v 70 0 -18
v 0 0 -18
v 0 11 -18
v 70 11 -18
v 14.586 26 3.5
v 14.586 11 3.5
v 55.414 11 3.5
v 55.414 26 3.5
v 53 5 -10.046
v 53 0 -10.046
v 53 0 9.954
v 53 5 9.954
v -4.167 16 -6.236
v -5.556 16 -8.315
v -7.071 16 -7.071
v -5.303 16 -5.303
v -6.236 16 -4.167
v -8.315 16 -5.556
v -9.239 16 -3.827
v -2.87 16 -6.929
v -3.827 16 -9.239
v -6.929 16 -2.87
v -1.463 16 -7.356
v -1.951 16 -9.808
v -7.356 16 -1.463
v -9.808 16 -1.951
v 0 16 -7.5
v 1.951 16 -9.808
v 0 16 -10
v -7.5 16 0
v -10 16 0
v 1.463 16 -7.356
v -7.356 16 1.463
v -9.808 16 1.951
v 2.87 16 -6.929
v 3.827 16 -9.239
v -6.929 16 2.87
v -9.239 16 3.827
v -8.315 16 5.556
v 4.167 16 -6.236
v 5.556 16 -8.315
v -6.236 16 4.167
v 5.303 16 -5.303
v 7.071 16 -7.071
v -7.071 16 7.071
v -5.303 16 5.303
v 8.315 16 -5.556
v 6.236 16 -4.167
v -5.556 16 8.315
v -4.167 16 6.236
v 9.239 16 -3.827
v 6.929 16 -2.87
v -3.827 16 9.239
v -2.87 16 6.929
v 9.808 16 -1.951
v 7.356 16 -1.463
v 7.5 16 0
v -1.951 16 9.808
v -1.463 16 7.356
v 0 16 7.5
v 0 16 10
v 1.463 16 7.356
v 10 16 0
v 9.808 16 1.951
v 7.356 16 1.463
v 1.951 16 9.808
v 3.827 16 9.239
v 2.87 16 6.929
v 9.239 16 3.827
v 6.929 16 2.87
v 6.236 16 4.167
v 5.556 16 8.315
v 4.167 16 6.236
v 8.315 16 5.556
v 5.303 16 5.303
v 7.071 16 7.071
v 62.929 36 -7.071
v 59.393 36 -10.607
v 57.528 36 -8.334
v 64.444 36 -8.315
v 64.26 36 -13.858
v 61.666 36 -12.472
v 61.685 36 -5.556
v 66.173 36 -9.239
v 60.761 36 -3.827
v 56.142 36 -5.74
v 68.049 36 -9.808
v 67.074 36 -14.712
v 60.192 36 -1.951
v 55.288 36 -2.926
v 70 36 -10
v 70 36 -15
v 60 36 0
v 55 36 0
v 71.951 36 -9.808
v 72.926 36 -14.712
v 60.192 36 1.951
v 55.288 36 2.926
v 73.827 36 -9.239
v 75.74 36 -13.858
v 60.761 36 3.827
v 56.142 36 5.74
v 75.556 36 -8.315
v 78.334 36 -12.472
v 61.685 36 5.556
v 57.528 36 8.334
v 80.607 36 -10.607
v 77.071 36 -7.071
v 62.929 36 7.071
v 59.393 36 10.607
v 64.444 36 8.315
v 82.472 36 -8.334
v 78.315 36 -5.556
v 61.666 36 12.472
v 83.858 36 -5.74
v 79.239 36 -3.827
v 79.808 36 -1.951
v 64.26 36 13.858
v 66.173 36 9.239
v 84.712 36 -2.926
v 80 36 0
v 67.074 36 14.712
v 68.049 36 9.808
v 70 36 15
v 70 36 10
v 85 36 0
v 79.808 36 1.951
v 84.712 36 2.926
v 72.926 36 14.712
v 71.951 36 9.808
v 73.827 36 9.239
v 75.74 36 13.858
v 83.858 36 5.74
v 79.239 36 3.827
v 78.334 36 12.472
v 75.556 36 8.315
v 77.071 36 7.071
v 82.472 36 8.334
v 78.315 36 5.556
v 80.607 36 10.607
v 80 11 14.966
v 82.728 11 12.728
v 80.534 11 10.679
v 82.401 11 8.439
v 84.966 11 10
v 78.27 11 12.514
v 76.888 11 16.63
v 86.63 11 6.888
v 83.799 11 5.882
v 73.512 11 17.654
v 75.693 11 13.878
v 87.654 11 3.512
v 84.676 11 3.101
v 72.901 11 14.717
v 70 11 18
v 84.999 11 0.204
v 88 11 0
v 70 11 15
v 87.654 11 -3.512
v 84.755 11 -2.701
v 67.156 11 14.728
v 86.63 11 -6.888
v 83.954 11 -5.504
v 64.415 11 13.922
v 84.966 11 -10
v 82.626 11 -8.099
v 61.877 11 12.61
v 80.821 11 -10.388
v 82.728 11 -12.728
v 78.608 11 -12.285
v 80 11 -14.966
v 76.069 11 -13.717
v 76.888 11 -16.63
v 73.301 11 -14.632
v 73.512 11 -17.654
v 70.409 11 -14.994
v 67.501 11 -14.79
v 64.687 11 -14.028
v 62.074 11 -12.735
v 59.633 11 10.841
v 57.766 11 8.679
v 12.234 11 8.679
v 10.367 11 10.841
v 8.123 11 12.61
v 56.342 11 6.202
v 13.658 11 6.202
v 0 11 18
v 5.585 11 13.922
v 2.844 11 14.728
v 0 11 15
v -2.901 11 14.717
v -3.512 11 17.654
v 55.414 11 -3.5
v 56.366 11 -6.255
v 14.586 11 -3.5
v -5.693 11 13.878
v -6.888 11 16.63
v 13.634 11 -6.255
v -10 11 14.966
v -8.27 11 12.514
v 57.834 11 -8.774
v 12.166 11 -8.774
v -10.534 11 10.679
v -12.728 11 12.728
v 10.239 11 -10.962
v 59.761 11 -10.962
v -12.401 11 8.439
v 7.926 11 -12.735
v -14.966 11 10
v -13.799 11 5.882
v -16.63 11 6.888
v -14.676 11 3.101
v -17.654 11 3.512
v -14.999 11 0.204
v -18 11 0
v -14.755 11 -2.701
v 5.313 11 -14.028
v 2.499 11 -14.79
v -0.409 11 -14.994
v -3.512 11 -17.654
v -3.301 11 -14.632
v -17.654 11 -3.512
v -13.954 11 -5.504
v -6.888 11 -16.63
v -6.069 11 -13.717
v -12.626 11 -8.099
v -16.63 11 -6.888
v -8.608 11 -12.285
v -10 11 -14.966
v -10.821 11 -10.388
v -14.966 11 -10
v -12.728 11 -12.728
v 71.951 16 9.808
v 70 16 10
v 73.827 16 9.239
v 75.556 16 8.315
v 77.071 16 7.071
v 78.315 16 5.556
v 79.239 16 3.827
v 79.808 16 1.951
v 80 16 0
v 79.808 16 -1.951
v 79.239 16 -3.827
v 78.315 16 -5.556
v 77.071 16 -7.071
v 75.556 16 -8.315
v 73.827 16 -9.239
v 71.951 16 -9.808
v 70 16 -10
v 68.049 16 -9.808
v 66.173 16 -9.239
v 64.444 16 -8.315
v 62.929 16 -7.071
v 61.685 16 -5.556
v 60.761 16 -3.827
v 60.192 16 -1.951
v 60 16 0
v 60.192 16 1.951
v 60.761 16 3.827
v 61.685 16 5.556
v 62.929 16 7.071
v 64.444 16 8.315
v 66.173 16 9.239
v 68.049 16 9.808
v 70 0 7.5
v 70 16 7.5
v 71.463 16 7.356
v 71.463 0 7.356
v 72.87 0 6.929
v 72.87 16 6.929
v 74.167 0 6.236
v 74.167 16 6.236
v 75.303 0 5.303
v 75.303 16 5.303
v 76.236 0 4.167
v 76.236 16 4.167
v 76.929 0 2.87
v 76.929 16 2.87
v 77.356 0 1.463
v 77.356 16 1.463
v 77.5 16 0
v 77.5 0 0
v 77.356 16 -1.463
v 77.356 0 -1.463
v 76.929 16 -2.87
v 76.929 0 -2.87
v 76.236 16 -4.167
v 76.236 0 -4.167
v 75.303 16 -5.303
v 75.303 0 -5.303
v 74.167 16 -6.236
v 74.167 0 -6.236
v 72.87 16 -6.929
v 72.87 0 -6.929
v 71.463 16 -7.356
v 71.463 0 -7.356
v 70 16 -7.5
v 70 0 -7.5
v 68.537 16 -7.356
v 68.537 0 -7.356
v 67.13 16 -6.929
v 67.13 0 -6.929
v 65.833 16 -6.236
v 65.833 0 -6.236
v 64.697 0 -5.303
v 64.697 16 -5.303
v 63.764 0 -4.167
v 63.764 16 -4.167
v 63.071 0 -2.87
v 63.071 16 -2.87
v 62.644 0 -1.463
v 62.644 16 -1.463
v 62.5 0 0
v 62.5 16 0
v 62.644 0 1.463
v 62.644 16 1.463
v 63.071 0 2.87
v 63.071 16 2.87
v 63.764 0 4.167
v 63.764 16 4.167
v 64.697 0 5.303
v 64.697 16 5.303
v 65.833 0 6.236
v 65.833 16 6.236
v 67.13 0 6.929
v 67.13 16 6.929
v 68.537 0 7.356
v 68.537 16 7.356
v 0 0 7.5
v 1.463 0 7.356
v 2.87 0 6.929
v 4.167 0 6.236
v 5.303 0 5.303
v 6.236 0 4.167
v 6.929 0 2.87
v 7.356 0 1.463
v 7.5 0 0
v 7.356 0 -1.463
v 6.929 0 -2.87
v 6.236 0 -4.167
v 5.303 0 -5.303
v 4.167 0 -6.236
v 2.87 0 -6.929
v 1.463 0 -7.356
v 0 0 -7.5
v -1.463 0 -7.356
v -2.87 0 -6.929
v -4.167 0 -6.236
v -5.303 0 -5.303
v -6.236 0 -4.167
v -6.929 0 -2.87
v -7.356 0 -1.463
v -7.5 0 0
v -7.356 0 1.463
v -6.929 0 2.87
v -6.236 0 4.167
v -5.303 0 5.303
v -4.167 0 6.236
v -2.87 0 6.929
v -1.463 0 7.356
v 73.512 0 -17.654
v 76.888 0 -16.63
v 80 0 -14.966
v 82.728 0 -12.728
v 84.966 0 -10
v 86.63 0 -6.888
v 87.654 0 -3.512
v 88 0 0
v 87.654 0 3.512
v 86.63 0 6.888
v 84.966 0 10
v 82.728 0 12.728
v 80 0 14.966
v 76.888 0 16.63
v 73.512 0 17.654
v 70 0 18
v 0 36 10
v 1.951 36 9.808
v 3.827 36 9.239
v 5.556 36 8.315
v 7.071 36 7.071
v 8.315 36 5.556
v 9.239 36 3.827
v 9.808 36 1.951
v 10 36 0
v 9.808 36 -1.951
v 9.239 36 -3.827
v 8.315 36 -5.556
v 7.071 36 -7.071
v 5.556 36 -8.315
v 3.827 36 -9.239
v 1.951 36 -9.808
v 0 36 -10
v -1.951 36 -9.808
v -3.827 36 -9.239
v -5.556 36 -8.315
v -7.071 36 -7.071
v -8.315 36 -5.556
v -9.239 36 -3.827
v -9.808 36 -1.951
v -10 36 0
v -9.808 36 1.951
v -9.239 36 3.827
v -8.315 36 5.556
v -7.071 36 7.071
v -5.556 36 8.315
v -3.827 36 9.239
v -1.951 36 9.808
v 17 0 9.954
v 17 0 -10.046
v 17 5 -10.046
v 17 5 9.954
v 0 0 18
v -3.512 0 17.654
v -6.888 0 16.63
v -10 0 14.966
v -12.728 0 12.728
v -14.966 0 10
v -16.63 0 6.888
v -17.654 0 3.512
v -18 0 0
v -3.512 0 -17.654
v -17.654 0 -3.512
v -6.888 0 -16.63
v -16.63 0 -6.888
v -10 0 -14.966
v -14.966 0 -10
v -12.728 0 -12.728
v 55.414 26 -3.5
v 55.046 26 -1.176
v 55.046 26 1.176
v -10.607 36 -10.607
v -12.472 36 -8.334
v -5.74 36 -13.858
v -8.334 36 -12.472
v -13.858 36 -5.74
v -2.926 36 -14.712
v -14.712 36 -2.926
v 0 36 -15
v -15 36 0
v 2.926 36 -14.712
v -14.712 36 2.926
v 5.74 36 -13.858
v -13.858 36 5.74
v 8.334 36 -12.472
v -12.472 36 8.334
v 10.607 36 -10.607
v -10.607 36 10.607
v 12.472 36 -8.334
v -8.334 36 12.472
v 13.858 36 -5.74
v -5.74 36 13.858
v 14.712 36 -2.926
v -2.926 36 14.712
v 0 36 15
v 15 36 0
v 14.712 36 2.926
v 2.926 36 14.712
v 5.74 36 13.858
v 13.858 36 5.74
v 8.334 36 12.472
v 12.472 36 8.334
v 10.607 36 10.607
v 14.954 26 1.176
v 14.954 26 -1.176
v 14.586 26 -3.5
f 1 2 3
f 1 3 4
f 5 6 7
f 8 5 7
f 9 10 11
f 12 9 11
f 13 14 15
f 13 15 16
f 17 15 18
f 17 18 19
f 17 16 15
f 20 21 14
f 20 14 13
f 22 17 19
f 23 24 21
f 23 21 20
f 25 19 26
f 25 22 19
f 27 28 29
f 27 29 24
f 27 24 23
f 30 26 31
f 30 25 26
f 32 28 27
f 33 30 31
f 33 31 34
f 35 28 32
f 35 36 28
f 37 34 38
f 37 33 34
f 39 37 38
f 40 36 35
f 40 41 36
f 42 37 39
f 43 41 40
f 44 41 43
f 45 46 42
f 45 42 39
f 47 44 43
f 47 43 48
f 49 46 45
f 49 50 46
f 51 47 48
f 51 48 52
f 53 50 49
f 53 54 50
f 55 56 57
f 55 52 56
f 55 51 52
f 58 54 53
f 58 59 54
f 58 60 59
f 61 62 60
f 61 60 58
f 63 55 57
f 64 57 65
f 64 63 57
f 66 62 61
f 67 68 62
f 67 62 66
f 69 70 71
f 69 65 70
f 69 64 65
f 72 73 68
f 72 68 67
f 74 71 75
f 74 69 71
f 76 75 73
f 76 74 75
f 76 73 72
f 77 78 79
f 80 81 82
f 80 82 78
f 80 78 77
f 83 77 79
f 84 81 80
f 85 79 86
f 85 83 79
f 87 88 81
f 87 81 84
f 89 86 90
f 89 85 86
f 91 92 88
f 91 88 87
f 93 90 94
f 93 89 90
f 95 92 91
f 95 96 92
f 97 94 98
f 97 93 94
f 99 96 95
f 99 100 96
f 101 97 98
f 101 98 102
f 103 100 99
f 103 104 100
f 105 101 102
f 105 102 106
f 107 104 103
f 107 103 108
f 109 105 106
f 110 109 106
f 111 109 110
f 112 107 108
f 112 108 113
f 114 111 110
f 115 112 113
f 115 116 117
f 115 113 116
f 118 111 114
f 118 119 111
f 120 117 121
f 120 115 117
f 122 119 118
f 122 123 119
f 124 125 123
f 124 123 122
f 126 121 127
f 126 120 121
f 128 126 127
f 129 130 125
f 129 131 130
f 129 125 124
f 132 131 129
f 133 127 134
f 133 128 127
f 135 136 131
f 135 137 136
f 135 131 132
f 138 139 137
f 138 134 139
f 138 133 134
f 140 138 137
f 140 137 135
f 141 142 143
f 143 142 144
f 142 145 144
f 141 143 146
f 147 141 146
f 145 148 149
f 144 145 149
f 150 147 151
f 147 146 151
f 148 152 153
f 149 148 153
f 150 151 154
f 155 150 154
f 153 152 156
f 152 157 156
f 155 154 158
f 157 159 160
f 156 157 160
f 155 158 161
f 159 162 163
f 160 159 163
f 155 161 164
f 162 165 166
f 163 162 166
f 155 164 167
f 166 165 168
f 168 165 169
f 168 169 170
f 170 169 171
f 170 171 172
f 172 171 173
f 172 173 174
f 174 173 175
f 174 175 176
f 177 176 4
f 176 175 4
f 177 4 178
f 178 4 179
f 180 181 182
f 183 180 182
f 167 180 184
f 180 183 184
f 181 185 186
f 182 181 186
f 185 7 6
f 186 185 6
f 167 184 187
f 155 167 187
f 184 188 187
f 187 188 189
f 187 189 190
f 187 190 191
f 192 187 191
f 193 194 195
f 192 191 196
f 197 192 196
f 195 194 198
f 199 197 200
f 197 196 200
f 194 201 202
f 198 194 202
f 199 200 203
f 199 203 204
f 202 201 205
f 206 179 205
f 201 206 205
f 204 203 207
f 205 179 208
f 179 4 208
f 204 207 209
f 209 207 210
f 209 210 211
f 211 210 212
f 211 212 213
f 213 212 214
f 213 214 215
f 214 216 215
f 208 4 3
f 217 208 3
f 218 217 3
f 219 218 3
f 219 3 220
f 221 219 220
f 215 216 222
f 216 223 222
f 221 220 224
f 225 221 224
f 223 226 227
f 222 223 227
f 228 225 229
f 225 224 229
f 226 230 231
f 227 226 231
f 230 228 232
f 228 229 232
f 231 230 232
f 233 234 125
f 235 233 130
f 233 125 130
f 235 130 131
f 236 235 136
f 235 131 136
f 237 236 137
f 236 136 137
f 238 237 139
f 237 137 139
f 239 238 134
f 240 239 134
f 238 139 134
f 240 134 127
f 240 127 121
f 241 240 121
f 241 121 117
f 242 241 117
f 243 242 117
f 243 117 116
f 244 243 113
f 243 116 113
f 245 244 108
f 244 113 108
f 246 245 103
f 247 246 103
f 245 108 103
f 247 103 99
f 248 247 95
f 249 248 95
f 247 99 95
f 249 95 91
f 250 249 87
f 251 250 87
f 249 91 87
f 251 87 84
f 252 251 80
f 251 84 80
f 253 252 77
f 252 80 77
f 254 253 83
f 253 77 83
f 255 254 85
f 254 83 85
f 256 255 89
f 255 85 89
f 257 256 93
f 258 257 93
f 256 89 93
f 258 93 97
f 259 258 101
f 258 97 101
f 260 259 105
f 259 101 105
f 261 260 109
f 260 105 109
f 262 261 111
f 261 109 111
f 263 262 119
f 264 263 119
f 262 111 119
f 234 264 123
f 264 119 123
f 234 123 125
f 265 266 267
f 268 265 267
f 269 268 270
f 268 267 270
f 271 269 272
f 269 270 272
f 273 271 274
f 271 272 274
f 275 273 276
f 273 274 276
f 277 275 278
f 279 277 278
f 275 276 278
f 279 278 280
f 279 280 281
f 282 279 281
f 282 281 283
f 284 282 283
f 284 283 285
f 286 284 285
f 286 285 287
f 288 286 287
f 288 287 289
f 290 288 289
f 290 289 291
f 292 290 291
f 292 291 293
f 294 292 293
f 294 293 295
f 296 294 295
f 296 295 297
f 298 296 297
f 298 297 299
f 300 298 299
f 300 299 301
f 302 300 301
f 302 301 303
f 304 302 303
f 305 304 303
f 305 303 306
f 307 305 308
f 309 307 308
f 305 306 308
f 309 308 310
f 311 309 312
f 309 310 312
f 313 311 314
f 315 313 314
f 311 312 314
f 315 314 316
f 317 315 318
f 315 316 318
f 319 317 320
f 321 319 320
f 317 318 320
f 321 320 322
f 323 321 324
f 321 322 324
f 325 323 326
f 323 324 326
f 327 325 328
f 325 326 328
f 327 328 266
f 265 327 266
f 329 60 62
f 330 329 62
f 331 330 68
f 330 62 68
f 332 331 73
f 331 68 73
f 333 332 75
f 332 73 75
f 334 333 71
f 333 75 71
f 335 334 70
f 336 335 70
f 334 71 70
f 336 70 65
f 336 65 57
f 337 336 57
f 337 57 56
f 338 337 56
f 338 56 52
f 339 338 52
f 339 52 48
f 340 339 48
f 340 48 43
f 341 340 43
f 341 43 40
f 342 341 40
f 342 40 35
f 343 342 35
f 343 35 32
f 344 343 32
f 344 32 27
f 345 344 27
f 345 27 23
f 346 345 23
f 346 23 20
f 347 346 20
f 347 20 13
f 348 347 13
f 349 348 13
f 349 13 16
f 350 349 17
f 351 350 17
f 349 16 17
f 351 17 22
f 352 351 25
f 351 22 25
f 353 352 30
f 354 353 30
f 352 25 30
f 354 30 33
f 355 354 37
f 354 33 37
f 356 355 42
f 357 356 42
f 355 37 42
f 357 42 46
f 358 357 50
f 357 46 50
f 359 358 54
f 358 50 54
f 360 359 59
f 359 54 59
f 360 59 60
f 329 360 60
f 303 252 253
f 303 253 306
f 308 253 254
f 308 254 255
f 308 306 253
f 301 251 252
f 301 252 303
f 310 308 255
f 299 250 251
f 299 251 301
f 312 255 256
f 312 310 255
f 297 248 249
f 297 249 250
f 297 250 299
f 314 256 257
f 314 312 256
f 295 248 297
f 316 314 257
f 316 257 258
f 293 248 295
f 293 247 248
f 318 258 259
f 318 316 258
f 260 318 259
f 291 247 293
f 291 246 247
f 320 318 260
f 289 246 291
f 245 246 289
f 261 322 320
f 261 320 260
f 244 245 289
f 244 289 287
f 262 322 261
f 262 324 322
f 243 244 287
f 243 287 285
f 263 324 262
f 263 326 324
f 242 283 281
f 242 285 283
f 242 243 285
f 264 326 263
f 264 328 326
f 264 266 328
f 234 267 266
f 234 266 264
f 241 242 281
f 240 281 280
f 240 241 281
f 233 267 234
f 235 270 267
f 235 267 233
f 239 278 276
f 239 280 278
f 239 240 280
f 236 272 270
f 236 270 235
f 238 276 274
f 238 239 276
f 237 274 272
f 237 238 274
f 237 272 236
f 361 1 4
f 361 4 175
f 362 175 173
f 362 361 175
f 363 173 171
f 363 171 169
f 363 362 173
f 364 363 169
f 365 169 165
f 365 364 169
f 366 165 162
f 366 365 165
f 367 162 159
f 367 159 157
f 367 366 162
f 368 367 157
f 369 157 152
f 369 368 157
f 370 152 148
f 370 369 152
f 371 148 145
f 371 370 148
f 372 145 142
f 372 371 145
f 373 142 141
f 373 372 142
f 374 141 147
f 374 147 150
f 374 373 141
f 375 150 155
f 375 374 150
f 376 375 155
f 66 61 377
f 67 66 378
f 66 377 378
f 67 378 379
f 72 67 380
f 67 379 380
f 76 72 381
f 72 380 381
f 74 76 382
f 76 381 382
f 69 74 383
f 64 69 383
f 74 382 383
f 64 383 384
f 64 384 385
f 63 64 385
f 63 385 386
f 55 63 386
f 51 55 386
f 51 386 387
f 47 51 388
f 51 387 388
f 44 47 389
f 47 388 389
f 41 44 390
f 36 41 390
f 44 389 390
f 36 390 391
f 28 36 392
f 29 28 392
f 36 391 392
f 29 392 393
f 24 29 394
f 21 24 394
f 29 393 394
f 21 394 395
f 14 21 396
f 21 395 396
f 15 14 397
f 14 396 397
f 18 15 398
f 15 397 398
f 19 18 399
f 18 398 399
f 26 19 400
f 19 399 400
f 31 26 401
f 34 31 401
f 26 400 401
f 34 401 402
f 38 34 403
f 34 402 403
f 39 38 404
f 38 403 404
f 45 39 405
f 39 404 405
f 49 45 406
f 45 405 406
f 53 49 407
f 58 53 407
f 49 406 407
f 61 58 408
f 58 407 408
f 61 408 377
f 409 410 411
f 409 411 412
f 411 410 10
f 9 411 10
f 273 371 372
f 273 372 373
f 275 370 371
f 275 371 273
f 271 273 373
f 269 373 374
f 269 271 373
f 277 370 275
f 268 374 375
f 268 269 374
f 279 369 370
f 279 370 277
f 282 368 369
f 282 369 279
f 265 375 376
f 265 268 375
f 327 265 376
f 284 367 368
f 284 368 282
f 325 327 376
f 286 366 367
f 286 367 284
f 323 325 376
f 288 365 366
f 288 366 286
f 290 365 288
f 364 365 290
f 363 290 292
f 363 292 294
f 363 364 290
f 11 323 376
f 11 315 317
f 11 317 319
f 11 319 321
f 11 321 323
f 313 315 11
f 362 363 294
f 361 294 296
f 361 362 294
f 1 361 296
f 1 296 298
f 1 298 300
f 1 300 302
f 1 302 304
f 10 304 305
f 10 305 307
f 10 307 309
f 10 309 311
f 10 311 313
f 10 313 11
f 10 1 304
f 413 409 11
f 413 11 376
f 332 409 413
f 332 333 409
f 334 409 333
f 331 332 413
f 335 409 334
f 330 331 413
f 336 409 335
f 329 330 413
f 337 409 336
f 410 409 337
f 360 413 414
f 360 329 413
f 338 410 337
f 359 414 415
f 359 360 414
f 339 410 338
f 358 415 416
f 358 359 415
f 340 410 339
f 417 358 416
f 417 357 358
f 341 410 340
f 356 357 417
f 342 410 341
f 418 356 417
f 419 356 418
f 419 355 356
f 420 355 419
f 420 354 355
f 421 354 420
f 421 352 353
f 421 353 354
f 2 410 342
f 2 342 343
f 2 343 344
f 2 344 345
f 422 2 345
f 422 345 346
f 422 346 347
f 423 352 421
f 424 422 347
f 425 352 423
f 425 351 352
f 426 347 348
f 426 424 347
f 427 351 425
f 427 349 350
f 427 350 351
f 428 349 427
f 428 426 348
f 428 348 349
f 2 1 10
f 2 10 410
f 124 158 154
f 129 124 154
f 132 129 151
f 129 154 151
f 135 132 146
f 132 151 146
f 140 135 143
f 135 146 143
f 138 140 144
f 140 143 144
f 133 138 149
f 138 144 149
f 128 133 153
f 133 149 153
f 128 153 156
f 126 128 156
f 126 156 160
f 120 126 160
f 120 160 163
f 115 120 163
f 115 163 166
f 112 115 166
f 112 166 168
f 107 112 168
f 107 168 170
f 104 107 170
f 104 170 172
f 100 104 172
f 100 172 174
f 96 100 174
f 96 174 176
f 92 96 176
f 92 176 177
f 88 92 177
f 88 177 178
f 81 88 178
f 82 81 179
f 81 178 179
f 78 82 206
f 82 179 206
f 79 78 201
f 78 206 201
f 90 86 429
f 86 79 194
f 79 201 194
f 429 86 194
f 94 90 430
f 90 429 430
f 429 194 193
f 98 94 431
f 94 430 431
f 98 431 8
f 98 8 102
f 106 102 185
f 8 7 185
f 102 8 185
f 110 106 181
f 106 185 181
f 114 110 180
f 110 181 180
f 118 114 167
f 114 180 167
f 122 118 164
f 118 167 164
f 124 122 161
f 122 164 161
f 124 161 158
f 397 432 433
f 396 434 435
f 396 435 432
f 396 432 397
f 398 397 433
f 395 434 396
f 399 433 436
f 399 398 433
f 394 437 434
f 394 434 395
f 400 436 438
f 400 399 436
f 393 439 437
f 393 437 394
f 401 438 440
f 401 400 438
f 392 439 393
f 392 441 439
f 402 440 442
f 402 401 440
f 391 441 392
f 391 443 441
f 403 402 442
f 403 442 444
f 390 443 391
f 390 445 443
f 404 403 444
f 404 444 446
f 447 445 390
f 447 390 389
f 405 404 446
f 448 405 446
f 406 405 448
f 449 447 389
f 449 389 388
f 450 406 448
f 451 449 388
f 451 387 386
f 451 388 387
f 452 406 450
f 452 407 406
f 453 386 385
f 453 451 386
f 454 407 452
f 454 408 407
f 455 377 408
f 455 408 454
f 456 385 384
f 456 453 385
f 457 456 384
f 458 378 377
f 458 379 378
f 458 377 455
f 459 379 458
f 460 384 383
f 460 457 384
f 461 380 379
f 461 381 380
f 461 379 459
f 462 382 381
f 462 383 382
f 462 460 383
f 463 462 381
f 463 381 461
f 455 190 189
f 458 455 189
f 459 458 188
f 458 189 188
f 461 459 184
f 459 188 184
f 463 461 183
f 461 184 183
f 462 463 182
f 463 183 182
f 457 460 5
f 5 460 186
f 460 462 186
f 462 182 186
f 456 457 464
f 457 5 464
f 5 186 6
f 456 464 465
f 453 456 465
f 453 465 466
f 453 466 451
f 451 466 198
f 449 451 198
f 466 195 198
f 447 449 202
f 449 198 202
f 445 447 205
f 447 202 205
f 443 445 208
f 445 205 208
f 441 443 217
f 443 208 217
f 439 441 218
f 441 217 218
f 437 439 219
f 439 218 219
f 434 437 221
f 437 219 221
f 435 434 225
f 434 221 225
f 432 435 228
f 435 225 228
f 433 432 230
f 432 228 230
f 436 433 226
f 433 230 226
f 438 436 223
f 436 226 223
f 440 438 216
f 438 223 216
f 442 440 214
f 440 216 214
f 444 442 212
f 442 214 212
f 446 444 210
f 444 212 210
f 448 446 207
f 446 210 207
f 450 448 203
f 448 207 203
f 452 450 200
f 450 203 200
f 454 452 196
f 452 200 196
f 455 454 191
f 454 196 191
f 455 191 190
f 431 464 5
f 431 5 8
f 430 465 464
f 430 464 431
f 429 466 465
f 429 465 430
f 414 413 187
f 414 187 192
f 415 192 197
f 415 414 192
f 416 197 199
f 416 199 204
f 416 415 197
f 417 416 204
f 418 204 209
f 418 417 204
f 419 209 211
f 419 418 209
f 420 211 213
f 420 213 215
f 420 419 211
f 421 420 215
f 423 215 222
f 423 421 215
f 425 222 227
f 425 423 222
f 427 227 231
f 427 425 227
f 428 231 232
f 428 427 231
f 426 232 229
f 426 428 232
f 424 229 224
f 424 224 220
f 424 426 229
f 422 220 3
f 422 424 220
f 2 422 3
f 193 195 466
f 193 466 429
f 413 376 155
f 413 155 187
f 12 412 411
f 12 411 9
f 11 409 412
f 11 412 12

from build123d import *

# Parameters (mm, degrees)
BOSS_EXTRUDE1_DEPTH = 11
SKETCH2_R           = 15
BOSS_EXTRUDE2_DEPTH = 25
SKETCH5_R           = 10
CUT_EXTRUDE1_DEPTH  = 20
SKETCH8_R           = 7.5
CUT_EXTRUDE2_DEPTH  = 93.021736563
SKETCH13_R          = 7.5
CUT_EXTRUDE3_DEPTH  = 93.021736563
SKETCH14_W          = 36
SKETCH14_H          = 20
CUT_EXTRUDE4_DEPTH  = 5
SKETCH18_W          = 40.91
SKETCH18_H          = 7
BOSS_EXTRUDE5_DEPTH = 15


with BuildPart() as part:
    # Sketch1 → Boss-Extrude1 (new body)
    with BuildSketch(Plane(origin=(0, 0, 0), x_dir=(1, 0, 0), z_dir=(0, 1, 0))):
        with BuildLine():
            Line((0, 18), (70, 18))
            ThreePointArc((70, 18), (88, 0), (70, -18))
            Line((70, -18), (0, -18))
            ThreePointArc((0, -18), (-18, 0), (0, 18))
        make_face()
    extrude(amount=BOSS_EXTRUDE1_DEPTH)

    # Sketch2 → Boss-Extrude2 (add)
    with BuildSketch(Plane(origin=(0, 11, 0), x_dir=(1, 0, 0), z_dir=(0, 1, 0))):
        with Locations(Location((0, 0, 0), (0, 0, 270))):
            Circle(SKETCH2_R)
        with Locations(Location((70, 0, 0), (0, 0, 270))):
            Circle(SKETCH2_R)
    extrude(amount=BOSS_EXTRUDE2_DEPTH)

    # Sketch5 → Cut-Extrude1 (cut)
    with BuildSketch(Plane(origin=(0, 36, 0), x_dir=(1, 0, 0), z_dir=(0, 1, 0))):
        with Locations(Location((70, 0, 0), (0, 0, 270))):
            Circle(SKETCH5_R)
        with Locations(Location((0, 0, 0), (0, 0, 270))):
            Circle(SKETCH5_R)
    extrude(amount=-CUT_EXTRUDE1_DEPTH, mode=Mode.SUBTRACT)

    # Sketch8 → Cut-Extrude2 (cut, through all)
    with BuildSketch(Plane(origin=(0, 16, 0), x_dir=(1, 0, 0), z_dir=(0, 1, 0))):
        with Locations(Location((0, 0, 0), (0, 0, 270))):
            Circle(SKETCH8_R)
    extrude(amount=-CUT_EXTRUDE2_DEPTH, mode=Mode.SUBTRACT)

    # Sketch13 → Cut-Extrude3 (cut, through all)
    with BuildSketch(Plane(origin=(0, 16, 0), x_dir=(1, 0, 0), z_dir=(0, 1, 0))):
        with Locations(Location((70, 0, 0), (0, 0, 270))):
            Circle(SKETCH13_R)
    extrude(amount=-CUT_EXTRUDE3_DEPTH, mode=Mode.SUBTRACT)

    # Sketch14 → Cut-Extrude4 (cut)
    with BuildSketch(Plane.XZ):
        with Locations((34.999969462, -0.04623456)):
            Rectangle(SKETCH14_W, SKETCH14_H)
    extrude(amount=-CUT_EXTRUDE4_DEPTH, mode=Mode.SUBTRACT)

    # Sketch18 → Boss-Extrude5 (add)
    with BuildSketch(Plane(origin=(0, 11, 0), x_dir=(1, 0, 0), z_dir=(0, 1, 0))):
        with Locations((35, 0)):
            Rectangle(SKETCH18_W, SKETCH18_H)
    extrude(amount=BOSS_EXTRUDE5_DEPTH)


solid = part.part
